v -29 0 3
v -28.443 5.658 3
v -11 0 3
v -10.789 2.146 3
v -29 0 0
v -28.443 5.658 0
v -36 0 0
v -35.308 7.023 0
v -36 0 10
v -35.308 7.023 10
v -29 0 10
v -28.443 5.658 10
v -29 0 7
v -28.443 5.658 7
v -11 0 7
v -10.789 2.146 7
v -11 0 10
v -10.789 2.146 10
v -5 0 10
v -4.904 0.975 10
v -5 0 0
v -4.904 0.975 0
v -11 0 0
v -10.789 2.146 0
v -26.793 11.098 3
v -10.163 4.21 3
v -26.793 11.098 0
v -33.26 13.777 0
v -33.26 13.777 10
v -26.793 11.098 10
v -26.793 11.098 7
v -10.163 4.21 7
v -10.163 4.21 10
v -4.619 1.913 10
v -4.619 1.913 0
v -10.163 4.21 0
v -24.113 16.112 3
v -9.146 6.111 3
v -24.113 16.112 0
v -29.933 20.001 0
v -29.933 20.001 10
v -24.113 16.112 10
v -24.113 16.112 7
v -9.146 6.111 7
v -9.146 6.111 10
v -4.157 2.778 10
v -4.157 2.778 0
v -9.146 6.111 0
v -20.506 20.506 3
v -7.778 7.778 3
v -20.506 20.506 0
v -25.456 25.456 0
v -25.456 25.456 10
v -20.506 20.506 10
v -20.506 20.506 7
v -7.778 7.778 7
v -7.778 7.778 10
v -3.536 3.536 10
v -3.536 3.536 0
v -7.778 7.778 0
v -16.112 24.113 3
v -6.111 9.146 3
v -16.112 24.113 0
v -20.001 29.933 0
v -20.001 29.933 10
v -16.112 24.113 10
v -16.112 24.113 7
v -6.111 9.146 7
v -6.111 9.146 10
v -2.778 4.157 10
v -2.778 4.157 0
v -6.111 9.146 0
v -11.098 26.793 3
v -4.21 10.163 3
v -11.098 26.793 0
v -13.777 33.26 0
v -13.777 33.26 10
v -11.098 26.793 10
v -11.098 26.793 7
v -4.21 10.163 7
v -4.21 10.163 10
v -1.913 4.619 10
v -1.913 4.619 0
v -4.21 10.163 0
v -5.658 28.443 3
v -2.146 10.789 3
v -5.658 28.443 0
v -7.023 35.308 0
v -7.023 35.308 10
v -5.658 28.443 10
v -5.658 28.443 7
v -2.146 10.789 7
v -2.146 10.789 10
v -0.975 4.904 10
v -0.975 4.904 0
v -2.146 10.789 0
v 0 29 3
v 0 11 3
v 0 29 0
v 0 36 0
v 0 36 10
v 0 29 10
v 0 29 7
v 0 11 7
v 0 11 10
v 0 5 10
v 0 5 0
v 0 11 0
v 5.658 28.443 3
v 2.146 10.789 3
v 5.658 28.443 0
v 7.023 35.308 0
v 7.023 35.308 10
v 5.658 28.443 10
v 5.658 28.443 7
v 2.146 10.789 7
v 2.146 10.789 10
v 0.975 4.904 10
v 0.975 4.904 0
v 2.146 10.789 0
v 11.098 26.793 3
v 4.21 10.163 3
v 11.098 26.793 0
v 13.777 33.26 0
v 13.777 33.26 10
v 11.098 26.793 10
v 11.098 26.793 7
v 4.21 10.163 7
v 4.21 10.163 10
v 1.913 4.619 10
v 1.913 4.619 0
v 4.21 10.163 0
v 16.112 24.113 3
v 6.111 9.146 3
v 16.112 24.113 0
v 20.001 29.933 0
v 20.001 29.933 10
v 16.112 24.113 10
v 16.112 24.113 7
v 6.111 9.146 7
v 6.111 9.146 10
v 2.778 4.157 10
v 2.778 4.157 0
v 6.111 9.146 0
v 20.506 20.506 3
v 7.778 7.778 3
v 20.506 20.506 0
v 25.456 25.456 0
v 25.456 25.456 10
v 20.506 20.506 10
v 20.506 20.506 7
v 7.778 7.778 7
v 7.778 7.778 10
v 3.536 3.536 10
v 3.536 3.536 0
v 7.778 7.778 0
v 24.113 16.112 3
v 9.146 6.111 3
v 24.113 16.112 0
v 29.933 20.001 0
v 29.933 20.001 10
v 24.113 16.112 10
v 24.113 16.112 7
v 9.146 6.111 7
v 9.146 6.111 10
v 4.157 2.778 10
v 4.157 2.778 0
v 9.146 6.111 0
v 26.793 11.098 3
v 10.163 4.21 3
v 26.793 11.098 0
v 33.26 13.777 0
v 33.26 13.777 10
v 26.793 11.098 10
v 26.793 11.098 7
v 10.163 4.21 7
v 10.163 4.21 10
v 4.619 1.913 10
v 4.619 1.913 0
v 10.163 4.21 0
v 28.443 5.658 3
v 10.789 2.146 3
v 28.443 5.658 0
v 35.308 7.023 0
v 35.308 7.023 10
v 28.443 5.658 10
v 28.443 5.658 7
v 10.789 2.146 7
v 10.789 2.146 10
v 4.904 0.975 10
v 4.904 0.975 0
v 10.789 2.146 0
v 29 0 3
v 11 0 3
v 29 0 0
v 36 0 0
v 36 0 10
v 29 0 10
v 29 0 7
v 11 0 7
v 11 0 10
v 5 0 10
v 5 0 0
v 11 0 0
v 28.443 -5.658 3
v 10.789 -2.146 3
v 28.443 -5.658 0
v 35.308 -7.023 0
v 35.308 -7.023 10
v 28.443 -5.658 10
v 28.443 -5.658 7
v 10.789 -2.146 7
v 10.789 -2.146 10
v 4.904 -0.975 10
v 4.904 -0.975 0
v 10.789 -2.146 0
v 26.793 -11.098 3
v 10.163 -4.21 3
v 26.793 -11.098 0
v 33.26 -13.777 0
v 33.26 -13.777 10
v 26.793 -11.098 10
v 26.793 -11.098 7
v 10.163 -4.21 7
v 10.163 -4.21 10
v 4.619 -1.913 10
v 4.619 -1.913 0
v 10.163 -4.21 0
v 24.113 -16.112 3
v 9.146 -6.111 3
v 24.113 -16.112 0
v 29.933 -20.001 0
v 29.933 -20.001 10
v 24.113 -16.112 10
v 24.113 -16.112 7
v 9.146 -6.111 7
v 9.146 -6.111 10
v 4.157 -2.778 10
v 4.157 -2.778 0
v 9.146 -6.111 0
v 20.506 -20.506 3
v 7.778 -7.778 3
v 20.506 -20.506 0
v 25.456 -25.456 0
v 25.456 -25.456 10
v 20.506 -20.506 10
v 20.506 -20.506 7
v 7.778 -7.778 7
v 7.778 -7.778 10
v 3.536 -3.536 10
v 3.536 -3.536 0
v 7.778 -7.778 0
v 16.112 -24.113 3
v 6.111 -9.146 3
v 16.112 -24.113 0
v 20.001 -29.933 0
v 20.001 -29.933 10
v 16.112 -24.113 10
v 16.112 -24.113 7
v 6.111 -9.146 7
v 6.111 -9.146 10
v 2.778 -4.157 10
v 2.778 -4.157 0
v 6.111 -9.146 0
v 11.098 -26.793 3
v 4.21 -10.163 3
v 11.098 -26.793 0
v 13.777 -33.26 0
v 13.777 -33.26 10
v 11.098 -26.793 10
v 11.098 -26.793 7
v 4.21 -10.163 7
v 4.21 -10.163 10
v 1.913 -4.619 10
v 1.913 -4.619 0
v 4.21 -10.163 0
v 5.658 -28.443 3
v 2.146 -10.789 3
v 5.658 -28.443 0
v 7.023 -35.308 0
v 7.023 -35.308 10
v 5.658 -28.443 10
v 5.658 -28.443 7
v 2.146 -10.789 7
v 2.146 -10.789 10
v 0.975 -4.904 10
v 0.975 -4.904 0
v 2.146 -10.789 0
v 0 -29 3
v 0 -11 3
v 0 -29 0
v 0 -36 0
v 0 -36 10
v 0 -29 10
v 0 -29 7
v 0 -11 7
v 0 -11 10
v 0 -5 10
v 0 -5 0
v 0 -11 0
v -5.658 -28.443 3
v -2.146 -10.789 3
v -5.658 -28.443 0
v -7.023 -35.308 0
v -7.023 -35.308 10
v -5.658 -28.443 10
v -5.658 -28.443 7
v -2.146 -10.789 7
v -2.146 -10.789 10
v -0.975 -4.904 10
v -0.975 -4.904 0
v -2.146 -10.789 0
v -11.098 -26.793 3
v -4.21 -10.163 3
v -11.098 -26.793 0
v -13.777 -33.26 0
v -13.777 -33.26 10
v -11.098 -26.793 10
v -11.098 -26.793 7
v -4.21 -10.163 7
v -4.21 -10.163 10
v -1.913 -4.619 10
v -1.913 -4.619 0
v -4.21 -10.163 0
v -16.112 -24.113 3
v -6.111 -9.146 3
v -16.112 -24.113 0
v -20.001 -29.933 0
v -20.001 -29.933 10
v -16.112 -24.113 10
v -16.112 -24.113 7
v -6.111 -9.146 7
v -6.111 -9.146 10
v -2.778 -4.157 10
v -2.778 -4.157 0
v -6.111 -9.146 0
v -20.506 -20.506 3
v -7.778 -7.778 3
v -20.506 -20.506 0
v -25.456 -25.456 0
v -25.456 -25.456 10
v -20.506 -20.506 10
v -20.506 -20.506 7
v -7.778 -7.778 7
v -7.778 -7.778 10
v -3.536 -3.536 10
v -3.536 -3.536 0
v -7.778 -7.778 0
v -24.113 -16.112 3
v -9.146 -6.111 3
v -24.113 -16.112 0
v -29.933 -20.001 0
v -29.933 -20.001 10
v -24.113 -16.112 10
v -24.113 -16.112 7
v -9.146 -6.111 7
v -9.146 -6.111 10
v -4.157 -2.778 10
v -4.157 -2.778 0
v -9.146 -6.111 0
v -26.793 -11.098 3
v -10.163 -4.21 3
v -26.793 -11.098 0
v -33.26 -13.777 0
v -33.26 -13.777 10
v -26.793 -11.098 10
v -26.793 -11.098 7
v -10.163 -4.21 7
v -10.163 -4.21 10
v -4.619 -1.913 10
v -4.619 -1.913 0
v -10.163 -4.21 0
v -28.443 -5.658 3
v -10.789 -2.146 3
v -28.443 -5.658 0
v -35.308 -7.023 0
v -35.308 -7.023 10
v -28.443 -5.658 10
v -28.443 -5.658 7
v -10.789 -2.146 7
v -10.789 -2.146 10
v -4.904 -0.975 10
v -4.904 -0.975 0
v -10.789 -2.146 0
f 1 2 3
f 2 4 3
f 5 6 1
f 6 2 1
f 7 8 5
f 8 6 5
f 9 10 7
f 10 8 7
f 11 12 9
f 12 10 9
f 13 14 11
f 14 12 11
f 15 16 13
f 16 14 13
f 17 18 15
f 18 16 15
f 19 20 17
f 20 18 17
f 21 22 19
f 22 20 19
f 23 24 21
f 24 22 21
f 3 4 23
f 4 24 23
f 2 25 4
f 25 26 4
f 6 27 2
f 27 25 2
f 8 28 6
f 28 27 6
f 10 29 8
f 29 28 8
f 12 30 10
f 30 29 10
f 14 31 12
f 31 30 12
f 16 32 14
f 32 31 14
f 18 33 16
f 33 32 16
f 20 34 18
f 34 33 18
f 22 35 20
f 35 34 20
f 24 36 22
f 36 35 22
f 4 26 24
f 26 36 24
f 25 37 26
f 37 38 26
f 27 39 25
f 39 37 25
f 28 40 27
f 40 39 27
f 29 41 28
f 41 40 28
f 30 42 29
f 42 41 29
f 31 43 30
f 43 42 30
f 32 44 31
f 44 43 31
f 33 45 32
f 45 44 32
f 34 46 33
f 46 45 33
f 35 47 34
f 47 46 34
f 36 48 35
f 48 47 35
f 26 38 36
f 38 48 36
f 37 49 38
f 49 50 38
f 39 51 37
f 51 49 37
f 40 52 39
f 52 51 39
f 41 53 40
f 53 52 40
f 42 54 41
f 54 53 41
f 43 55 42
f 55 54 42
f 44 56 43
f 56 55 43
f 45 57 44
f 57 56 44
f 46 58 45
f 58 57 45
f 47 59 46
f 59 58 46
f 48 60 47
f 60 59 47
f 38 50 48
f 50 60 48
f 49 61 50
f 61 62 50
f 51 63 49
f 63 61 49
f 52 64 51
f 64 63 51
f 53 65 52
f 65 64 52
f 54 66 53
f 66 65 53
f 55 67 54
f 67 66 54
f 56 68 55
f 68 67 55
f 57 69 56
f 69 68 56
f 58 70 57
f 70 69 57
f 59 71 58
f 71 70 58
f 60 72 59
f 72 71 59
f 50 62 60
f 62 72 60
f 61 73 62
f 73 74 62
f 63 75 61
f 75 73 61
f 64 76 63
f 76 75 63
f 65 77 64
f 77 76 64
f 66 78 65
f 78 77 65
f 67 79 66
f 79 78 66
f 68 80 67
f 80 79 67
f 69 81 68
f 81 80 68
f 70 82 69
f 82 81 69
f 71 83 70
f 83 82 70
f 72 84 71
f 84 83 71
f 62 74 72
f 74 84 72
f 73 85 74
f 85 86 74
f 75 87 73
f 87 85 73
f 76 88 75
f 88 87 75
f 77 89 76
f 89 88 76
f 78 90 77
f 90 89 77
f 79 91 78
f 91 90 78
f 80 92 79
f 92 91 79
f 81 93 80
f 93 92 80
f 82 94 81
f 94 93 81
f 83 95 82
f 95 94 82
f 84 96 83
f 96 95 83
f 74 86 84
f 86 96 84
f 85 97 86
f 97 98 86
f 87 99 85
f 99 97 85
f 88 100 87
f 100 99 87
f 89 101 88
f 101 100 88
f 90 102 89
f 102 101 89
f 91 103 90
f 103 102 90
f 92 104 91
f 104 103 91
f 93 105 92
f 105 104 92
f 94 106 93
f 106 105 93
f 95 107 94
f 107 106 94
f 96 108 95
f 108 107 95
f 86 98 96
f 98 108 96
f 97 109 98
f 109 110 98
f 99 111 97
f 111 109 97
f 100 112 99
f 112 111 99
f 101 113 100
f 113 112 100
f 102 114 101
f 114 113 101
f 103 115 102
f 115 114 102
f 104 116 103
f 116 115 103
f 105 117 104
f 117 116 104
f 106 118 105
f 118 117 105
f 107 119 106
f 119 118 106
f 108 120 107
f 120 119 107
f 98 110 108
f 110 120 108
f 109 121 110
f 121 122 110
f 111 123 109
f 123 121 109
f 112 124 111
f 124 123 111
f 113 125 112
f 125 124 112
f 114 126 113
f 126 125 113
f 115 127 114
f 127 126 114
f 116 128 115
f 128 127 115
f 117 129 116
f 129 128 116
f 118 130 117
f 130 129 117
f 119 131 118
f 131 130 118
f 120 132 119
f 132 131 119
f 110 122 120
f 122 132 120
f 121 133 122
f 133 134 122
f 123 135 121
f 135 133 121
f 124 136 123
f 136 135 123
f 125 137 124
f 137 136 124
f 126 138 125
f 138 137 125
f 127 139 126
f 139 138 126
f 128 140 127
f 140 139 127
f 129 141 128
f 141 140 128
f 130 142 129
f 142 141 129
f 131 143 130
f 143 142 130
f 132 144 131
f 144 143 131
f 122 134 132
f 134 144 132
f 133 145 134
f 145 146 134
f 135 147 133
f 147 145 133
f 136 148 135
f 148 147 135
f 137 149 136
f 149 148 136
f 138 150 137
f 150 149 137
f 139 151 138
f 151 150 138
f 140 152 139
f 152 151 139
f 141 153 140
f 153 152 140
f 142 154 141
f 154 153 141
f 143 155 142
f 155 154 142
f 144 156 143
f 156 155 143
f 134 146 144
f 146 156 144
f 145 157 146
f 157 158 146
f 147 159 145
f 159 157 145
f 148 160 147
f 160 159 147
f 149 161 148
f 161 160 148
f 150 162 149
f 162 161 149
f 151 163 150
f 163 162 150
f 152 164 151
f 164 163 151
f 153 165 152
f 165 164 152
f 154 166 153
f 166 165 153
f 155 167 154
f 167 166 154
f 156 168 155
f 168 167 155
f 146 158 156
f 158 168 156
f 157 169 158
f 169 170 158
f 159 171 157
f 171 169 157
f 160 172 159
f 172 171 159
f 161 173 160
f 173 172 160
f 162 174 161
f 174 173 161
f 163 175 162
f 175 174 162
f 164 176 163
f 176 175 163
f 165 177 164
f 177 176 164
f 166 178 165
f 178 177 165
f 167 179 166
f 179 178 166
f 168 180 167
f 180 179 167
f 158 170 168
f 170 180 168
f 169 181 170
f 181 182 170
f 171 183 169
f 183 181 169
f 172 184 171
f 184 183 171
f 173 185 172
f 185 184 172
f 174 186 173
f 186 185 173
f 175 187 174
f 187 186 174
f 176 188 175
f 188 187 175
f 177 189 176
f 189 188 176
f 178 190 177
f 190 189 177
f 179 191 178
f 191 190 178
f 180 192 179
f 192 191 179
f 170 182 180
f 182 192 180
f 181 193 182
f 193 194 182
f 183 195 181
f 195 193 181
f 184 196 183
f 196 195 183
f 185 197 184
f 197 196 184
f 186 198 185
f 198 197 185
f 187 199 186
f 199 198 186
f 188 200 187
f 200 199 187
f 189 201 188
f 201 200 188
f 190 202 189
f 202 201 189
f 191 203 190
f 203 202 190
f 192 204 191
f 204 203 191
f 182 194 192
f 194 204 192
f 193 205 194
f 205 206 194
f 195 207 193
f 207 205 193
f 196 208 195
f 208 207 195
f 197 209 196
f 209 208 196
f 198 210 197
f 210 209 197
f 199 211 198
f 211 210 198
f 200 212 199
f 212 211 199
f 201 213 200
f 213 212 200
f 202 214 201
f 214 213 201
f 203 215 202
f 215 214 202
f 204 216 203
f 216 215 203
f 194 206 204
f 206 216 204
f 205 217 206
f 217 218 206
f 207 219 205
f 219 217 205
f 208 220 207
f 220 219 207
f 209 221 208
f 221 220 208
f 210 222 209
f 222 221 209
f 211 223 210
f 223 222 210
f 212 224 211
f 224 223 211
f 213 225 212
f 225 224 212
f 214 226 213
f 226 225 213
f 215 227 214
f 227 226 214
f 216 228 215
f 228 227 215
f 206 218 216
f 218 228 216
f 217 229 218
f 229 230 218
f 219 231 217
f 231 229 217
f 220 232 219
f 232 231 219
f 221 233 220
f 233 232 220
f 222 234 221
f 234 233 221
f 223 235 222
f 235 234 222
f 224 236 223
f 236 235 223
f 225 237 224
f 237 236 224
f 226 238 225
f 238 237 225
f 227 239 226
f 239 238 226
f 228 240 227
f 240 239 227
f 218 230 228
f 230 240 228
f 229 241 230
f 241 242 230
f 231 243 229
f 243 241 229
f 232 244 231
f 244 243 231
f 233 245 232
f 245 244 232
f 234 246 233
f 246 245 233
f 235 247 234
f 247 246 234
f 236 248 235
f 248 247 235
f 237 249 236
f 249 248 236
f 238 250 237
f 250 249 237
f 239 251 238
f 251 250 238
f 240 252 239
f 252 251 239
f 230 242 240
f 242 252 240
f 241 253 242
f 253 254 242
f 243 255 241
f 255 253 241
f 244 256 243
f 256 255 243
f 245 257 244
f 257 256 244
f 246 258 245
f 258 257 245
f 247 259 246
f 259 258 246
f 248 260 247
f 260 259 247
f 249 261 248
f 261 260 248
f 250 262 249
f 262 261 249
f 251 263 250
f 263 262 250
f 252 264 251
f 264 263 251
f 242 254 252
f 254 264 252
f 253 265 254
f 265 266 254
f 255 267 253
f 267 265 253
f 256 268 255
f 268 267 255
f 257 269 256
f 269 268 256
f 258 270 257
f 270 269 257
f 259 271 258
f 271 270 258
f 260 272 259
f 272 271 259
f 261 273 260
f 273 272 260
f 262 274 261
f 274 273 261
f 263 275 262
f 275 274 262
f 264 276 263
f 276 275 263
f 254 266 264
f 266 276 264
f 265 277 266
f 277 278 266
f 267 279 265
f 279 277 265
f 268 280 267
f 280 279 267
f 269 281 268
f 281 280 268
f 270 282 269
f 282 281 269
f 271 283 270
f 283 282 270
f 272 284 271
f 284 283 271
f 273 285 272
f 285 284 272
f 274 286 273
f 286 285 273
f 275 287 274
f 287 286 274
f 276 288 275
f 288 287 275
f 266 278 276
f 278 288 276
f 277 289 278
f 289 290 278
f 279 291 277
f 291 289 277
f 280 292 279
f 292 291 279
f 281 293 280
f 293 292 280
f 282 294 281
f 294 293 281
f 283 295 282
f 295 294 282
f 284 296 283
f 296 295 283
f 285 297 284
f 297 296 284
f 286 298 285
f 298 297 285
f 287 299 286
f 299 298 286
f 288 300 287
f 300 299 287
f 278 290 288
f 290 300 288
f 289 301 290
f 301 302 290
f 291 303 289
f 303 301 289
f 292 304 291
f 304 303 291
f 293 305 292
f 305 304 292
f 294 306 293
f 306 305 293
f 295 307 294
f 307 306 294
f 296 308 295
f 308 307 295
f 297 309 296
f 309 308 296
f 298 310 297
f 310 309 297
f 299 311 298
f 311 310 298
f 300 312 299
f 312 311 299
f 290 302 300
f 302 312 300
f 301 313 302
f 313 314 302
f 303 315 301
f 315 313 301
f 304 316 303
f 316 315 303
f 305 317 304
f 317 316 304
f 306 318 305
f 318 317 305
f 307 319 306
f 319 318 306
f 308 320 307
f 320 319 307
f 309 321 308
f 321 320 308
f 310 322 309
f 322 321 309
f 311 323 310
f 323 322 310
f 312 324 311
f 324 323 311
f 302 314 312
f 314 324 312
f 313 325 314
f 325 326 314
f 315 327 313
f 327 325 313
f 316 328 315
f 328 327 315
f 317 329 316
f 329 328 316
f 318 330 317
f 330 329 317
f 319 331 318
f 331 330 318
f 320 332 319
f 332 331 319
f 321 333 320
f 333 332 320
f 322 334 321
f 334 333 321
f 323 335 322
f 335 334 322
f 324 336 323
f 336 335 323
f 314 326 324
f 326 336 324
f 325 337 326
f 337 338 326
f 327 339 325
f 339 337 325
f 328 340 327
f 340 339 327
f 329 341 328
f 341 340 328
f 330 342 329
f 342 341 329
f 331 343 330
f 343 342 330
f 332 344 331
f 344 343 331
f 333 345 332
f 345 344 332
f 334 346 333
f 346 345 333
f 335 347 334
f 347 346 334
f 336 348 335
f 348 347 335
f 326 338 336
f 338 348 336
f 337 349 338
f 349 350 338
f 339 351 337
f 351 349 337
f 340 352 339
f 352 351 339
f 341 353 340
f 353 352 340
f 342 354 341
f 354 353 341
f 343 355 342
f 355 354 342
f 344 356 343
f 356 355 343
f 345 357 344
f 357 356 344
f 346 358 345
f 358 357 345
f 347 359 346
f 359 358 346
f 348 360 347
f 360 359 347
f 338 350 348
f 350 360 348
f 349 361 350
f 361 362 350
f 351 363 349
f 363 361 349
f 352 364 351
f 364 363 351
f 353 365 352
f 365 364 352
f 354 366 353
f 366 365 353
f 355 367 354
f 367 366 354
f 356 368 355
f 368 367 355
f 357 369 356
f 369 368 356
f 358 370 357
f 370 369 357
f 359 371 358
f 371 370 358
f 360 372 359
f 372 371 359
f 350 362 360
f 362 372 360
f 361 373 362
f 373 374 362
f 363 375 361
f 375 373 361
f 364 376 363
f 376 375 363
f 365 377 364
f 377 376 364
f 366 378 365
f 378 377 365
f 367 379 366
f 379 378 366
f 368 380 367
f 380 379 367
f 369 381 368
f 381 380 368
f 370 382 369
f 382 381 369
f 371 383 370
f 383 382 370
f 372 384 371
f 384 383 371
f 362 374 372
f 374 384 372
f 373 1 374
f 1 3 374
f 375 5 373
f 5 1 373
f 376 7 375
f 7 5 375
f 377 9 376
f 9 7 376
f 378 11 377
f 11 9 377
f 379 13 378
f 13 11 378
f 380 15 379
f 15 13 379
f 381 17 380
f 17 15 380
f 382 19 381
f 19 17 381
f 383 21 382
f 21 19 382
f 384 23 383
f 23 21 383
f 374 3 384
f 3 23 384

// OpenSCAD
$fn = 32;

// ----------------------------------------------------------------------
// Revolved part: handwheel R36
// ----------------------------------------------------------------------

// --- parameters (mm) ---
bore_r = 5;               // bore radius
rim_r = 36;               // rim radius
rim_w = 7;                // rim axial width
rim_t = 10;               // rim diameter height
hub_r = 11;               // hub radius
web_t = 4;                // web thickness
revolve_angle = 360;      // revolve sweep, degrees

bore_d = 2 * bore_r;
rim_d = 2 * rim_r;
hub_d = 2 * hub_r;

profile = [[5, 0], [11, 0], [11, 3], [29, 3], [29, 0], [36, 0], [36, 10], [29, 10], [29, 7], [11, 7], [11, 10], [5, 10]];  // primary outline, 12 points, counter clockwise

// --- the one profile operation ---
rotate_extrude(angle = revolve_angle) polygon(points = profile);
